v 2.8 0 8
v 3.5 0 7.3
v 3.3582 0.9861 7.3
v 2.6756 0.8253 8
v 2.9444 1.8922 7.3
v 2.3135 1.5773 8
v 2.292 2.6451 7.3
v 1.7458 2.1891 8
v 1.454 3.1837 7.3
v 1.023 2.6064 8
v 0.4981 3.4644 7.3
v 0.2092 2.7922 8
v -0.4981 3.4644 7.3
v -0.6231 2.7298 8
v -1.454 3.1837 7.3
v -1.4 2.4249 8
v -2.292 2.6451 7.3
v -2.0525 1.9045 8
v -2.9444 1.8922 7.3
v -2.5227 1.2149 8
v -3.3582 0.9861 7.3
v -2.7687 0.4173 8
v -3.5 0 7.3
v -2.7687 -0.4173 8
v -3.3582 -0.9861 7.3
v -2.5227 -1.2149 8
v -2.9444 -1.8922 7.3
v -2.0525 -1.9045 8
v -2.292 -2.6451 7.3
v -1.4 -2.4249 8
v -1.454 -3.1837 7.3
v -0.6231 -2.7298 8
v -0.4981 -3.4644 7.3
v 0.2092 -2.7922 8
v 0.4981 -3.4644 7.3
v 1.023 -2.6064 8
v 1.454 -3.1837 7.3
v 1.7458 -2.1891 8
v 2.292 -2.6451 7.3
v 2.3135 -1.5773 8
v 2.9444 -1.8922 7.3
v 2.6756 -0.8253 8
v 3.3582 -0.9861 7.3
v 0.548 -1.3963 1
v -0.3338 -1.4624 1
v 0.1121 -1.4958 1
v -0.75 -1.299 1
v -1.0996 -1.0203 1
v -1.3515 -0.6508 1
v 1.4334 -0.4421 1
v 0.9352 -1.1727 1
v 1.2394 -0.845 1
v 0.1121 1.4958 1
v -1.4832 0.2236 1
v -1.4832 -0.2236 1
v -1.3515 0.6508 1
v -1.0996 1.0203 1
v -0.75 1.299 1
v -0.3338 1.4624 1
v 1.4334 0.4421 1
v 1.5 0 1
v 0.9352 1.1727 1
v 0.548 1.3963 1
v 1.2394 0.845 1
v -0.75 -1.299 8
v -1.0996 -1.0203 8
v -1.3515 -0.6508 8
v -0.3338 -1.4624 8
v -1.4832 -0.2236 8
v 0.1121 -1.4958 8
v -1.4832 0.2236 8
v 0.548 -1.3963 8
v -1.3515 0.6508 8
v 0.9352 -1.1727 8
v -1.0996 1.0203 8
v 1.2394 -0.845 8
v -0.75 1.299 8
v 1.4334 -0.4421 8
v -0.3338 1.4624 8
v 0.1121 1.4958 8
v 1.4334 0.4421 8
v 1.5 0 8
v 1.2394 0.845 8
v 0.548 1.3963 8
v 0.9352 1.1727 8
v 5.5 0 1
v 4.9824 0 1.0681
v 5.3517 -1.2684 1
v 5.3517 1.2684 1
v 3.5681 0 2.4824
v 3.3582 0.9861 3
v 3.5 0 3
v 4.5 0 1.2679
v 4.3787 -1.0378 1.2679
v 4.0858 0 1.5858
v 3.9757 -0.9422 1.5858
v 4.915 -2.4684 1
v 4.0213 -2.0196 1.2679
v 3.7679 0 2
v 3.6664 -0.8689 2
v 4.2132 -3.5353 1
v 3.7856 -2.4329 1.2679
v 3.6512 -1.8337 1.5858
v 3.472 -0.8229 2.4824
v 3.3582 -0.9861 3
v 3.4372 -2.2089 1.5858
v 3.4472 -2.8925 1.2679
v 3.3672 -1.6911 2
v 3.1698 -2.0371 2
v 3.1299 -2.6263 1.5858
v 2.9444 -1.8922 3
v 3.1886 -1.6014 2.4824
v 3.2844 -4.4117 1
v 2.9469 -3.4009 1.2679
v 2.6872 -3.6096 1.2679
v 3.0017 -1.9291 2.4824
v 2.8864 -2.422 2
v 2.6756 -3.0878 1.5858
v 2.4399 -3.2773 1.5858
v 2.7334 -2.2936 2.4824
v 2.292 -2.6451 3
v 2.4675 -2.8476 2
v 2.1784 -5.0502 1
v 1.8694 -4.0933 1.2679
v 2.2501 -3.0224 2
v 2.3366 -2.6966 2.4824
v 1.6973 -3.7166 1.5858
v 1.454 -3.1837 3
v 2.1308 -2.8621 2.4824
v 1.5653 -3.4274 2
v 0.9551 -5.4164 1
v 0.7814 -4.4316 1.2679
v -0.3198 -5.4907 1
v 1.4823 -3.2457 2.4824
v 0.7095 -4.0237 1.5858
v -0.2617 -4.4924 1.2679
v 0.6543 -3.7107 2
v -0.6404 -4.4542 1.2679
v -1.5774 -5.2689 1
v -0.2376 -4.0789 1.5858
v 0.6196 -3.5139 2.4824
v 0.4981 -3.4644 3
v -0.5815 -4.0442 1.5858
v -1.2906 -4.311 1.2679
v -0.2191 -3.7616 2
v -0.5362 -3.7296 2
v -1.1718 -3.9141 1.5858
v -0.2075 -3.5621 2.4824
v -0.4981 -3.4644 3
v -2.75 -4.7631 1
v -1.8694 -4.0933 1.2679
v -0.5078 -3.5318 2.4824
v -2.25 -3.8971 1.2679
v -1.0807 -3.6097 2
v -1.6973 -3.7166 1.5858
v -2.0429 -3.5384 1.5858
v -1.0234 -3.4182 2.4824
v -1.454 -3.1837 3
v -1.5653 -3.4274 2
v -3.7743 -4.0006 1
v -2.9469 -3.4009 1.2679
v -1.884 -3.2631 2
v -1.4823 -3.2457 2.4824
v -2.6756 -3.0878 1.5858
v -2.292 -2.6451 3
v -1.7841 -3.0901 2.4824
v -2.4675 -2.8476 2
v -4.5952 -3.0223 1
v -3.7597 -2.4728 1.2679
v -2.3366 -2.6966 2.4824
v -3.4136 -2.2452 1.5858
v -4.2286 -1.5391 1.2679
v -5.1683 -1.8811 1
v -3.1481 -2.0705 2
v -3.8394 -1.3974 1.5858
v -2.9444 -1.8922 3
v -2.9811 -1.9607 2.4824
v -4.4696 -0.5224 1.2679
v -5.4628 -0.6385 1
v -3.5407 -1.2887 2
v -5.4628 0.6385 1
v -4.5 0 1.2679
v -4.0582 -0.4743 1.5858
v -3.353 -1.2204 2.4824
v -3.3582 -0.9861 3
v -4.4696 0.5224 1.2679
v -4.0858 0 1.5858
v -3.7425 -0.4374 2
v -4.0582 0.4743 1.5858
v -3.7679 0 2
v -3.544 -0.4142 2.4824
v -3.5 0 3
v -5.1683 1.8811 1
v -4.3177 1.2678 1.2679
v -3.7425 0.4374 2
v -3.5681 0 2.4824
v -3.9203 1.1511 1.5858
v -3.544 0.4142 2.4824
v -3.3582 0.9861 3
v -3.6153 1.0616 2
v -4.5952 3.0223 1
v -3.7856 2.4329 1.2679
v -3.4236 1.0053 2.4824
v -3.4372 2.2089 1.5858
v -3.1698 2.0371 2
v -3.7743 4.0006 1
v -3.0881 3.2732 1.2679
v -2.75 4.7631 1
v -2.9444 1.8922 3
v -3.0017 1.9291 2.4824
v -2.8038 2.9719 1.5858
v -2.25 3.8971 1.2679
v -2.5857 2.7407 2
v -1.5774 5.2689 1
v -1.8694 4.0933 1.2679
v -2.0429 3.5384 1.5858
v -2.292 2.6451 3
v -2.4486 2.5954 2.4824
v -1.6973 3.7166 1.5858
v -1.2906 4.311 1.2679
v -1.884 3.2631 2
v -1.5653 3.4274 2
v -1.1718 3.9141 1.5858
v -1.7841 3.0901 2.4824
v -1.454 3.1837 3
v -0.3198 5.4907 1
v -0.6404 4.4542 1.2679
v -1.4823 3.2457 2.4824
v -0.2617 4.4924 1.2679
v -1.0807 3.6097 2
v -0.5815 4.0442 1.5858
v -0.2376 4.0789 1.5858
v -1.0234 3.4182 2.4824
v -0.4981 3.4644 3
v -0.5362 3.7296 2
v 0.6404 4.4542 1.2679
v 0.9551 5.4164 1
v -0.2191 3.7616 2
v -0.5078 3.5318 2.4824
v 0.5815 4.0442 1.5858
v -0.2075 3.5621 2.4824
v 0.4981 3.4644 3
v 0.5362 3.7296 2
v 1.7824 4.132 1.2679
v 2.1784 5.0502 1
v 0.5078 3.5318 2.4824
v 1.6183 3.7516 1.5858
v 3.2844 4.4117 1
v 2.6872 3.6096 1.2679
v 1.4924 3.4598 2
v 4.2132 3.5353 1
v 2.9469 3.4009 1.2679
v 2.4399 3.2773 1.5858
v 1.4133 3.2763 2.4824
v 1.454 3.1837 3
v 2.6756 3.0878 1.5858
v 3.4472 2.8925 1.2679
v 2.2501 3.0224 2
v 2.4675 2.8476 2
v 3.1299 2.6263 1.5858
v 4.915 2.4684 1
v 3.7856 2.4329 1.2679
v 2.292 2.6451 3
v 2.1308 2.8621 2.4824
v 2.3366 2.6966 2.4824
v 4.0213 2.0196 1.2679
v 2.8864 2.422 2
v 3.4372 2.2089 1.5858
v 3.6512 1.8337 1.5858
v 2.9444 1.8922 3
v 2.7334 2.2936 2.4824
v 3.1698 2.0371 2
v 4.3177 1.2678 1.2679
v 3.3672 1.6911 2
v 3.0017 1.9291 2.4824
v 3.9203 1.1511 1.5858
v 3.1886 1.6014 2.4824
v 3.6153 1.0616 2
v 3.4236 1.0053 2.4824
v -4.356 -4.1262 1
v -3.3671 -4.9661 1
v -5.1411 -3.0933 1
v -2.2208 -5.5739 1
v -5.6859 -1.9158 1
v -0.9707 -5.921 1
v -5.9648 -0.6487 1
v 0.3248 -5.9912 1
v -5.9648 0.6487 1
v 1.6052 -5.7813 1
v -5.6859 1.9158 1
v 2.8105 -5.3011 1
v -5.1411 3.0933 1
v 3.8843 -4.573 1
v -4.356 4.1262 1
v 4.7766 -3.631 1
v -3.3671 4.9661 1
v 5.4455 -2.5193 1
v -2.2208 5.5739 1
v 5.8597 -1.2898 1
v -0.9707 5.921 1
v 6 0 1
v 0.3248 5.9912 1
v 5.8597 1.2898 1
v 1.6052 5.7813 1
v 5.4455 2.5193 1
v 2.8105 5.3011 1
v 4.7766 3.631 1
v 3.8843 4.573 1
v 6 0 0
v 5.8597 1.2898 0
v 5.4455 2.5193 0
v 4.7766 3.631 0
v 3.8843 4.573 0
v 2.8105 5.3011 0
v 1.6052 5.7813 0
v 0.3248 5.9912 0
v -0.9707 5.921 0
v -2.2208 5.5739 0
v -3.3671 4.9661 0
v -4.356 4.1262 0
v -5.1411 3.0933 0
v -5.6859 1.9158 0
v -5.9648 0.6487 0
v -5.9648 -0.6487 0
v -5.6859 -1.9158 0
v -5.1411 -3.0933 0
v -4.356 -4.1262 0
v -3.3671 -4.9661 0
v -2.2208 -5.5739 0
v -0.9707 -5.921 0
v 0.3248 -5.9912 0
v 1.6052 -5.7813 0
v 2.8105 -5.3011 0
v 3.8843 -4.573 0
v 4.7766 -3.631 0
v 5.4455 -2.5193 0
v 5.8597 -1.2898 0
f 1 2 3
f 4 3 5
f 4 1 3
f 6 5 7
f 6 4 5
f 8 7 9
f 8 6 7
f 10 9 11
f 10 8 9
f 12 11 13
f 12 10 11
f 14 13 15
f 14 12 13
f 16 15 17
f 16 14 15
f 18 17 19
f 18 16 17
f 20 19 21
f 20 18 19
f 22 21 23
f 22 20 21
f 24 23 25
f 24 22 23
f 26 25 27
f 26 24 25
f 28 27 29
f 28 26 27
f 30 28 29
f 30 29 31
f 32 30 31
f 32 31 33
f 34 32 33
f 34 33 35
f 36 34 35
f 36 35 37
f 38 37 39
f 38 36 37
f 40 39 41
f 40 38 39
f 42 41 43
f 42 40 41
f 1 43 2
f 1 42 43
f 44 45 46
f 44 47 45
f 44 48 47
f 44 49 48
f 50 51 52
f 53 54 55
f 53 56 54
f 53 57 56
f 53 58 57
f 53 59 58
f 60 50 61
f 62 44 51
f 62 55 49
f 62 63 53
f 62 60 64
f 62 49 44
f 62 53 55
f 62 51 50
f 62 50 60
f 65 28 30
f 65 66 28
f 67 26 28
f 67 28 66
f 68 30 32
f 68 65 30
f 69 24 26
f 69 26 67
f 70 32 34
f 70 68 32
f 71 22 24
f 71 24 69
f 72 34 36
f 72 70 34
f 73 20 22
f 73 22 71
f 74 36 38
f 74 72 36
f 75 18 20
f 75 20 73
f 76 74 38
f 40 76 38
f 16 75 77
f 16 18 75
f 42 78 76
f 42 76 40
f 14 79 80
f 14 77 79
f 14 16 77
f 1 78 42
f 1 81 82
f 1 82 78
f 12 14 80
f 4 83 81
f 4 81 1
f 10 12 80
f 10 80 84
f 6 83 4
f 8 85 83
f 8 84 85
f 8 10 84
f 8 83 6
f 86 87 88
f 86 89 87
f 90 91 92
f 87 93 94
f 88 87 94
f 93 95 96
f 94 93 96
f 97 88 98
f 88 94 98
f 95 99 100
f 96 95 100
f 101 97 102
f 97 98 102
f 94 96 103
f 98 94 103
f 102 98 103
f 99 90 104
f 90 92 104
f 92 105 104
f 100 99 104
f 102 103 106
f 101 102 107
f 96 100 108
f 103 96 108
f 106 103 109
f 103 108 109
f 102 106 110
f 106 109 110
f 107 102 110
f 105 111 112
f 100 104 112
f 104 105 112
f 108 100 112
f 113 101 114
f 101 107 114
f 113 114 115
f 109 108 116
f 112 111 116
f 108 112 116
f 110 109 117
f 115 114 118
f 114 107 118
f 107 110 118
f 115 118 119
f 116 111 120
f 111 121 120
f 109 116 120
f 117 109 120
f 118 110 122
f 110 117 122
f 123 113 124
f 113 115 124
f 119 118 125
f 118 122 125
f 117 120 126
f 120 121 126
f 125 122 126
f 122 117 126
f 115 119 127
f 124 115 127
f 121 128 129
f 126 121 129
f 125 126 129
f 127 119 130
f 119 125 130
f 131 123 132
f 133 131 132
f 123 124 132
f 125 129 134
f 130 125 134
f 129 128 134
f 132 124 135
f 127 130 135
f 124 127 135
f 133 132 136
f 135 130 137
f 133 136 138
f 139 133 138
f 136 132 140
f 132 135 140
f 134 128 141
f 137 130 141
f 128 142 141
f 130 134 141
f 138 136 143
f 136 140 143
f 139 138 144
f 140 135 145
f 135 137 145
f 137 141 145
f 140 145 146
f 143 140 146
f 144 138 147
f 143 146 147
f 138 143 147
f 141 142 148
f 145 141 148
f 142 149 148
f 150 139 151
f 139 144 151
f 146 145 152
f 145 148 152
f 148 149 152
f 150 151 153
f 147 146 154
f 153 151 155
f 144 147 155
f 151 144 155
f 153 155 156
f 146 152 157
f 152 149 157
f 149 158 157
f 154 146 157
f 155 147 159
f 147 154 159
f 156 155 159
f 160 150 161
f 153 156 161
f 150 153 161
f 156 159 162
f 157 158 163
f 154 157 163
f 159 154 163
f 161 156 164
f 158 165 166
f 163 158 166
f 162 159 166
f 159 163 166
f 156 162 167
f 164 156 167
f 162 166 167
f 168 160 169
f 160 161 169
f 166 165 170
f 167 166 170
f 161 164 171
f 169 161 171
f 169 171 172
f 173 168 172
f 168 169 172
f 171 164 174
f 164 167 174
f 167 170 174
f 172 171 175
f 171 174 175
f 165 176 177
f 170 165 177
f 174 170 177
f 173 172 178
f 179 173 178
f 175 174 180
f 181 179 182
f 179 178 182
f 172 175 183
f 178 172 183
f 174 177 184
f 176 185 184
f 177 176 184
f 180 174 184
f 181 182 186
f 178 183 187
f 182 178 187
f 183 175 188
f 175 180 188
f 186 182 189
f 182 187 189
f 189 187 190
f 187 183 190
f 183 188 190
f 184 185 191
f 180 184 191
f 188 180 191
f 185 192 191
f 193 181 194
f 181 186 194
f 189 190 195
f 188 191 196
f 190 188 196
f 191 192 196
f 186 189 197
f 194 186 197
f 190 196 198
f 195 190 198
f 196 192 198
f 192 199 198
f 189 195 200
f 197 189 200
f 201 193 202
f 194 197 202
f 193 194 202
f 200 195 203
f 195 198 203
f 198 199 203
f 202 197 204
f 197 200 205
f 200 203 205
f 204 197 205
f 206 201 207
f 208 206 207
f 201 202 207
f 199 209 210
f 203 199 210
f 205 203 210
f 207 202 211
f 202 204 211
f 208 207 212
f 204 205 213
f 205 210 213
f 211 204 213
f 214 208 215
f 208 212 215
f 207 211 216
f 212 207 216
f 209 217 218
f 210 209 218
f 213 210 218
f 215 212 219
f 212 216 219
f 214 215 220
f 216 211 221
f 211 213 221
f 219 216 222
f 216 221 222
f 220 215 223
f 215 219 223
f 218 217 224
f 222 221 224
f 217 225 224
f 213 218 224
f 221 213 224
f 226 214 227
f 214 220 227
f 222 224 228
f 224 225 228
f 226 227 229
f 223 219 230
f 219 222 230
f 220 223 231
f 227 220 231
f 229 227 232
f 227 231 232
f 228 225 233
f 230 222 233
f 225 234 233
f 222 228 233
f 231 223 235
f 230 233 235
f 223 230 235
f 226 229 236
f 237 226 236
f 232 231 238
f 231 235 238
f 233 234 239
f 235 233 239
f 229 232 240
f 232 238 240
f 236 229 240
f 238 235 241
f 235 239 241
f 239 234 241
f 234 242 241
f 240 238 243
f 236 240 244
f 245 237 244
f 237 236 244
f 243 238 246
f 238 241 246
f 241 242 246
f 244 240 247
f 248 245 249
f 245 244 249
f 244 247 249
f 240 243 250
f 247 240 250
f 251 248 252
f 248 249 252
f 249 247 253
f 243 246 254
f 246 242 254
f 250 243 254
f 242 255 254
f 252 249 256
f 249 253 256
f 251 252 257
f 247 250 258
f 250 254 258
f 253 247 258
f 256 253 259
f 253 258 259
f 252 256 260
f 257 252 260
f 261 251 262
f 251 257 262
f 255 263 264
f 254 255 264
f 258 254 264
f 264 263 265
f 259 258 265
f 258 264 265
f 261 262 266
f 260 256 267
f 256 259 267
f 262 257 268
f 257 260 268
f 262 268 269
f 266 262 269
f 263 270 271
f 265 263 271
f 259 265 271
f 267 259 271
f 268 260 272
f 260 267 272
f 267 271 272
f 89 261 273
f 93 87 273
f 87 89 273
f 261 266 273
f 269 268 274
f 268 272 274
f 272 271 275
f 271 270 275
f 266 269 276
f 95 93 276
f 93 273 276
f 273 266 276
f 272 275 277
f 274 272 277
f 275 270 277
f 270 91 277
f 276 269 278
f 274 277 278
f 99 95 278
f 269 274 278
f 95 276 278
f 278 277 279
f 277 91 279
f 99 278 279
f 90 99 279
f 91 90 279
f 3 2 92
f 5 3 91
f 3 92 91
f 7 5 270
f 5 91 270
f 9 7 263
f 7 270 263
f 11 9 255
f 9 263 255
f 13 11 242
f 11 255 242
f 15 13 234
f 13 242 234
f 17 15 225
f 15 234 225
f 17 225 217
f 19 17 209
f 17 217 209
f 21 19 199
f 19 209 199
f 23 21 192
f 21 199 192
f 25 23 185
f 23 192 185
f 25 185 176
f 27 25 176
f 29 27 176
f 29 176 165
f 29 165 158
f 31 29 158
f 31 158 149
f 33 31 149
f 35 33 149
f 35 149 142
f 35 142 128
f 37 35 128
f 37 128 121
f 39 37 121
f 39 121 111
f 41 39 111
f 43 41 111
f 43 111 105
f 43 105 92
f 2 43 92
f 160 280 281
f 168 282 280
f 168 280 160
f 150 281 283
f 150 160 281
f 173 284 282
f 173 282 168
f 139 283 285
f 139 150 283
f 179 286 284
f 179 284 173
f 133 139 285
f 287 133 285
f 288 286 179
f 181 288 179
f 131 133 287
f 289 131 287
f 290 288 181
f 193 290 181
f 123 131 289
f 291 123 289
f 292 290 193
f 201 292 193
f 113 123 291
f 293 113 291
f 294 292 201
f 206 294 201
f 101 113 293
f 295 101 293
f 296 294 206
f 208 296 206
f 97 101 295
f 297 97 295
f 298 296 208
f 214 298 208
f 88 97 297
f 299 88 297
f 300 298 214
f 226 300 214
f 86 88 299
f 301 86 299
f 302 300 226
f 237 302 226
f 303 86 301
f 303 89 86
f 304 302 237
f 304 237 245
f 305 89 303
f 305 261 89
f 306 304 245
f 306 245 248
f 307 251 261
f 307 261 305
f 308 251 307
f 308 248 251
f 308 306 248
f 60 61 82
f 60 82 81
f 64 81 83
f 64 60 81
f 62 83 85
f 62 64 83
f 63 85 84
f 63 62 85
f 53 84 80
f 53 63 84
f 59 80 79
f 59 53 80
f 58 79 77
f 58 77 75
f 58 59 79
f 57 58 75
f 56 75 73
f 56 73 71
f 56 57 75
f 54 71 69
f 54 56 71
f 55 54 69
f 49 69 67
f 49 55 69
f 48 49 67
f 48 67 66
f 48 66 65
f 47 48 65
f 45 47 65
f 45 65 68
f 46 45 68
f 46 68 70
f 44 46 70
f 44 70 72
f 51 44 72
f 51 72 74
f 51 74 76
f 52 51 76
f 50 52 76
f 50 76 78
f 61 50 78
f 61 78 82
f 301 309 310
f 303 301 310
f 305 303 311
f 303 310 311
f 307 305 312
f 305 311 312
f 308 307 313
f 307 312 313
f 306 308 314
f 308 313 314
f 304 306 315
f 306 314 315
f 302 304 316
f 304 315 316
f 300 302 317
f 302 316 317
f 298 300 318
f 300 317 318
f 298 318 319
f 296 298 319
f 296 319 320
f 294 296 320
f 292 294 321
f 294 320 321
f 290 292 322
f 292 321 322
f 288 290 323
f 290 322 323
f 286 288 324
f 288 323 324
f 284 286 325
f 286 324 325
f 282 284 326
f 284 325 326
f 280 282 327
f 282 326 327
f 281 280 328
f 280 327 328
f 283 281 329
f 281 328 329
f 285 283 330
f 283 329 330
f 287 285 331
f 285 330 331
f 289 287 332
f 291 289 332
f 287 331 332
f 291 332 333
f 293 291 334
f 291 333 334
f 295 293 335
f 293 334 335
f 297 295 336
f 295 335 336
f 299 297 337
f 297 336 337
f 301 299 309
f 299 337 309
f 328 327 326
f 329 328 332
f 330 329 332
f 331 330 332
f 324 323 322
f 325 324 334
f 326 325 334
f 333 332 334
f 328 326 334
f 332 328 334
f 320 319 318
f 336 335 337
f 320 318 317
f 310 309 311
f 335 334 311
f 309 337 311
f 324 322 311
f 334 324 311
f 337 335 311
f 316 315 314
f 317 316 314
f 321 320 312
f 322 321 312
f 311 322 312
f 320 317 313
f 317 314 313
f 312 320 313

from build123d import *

# Parameters (mm, degrees)
F0_R     = 6
F0_R_2   = 3.5
F0_R_3   = 1.5
F1_DEPTH = 1
F2_DEPTH = 8
F3_R     = 2
F4_SIZE  = 0.7


with BuildPart() as f1:
    # F0 (on Top) → F1 (new body)
    with BuildSketch(Plane.XY):
        Circle(F0_R)
        Circle(F0_R_2, mode=Mode.SUBTRACT)
        Circle(F0_R_2)
        Circle(F0_R_3, mode=Mode.SUBTRACT)
        Circle(F0_R_3)
    extrude(amount=F1_DEPTH)

    # F0 (on Top) → F2 (join)
    with BuildSketch(Plane.XY):
        Circle(F0_R_2)
        Circle(F0_R_3, mode=Mode.SUBTRACT)
    extrude(amount=F2_DEPTH)

    # F3
    f3_edges = [f1.edges().sort_by_distance(p)[0] for p in [
        (-3.5, 0, 1),
    ]]
    fillet(f3_edges, radius=F3_R)

    # F4
    f4_edges = [f1.edges().sort_by_distance(p)[0] for p in [
        (-3.5, 0, 8),
    ]]
    chamfer(f4_edges, length=F4_SIZE)


solid = f1.part
